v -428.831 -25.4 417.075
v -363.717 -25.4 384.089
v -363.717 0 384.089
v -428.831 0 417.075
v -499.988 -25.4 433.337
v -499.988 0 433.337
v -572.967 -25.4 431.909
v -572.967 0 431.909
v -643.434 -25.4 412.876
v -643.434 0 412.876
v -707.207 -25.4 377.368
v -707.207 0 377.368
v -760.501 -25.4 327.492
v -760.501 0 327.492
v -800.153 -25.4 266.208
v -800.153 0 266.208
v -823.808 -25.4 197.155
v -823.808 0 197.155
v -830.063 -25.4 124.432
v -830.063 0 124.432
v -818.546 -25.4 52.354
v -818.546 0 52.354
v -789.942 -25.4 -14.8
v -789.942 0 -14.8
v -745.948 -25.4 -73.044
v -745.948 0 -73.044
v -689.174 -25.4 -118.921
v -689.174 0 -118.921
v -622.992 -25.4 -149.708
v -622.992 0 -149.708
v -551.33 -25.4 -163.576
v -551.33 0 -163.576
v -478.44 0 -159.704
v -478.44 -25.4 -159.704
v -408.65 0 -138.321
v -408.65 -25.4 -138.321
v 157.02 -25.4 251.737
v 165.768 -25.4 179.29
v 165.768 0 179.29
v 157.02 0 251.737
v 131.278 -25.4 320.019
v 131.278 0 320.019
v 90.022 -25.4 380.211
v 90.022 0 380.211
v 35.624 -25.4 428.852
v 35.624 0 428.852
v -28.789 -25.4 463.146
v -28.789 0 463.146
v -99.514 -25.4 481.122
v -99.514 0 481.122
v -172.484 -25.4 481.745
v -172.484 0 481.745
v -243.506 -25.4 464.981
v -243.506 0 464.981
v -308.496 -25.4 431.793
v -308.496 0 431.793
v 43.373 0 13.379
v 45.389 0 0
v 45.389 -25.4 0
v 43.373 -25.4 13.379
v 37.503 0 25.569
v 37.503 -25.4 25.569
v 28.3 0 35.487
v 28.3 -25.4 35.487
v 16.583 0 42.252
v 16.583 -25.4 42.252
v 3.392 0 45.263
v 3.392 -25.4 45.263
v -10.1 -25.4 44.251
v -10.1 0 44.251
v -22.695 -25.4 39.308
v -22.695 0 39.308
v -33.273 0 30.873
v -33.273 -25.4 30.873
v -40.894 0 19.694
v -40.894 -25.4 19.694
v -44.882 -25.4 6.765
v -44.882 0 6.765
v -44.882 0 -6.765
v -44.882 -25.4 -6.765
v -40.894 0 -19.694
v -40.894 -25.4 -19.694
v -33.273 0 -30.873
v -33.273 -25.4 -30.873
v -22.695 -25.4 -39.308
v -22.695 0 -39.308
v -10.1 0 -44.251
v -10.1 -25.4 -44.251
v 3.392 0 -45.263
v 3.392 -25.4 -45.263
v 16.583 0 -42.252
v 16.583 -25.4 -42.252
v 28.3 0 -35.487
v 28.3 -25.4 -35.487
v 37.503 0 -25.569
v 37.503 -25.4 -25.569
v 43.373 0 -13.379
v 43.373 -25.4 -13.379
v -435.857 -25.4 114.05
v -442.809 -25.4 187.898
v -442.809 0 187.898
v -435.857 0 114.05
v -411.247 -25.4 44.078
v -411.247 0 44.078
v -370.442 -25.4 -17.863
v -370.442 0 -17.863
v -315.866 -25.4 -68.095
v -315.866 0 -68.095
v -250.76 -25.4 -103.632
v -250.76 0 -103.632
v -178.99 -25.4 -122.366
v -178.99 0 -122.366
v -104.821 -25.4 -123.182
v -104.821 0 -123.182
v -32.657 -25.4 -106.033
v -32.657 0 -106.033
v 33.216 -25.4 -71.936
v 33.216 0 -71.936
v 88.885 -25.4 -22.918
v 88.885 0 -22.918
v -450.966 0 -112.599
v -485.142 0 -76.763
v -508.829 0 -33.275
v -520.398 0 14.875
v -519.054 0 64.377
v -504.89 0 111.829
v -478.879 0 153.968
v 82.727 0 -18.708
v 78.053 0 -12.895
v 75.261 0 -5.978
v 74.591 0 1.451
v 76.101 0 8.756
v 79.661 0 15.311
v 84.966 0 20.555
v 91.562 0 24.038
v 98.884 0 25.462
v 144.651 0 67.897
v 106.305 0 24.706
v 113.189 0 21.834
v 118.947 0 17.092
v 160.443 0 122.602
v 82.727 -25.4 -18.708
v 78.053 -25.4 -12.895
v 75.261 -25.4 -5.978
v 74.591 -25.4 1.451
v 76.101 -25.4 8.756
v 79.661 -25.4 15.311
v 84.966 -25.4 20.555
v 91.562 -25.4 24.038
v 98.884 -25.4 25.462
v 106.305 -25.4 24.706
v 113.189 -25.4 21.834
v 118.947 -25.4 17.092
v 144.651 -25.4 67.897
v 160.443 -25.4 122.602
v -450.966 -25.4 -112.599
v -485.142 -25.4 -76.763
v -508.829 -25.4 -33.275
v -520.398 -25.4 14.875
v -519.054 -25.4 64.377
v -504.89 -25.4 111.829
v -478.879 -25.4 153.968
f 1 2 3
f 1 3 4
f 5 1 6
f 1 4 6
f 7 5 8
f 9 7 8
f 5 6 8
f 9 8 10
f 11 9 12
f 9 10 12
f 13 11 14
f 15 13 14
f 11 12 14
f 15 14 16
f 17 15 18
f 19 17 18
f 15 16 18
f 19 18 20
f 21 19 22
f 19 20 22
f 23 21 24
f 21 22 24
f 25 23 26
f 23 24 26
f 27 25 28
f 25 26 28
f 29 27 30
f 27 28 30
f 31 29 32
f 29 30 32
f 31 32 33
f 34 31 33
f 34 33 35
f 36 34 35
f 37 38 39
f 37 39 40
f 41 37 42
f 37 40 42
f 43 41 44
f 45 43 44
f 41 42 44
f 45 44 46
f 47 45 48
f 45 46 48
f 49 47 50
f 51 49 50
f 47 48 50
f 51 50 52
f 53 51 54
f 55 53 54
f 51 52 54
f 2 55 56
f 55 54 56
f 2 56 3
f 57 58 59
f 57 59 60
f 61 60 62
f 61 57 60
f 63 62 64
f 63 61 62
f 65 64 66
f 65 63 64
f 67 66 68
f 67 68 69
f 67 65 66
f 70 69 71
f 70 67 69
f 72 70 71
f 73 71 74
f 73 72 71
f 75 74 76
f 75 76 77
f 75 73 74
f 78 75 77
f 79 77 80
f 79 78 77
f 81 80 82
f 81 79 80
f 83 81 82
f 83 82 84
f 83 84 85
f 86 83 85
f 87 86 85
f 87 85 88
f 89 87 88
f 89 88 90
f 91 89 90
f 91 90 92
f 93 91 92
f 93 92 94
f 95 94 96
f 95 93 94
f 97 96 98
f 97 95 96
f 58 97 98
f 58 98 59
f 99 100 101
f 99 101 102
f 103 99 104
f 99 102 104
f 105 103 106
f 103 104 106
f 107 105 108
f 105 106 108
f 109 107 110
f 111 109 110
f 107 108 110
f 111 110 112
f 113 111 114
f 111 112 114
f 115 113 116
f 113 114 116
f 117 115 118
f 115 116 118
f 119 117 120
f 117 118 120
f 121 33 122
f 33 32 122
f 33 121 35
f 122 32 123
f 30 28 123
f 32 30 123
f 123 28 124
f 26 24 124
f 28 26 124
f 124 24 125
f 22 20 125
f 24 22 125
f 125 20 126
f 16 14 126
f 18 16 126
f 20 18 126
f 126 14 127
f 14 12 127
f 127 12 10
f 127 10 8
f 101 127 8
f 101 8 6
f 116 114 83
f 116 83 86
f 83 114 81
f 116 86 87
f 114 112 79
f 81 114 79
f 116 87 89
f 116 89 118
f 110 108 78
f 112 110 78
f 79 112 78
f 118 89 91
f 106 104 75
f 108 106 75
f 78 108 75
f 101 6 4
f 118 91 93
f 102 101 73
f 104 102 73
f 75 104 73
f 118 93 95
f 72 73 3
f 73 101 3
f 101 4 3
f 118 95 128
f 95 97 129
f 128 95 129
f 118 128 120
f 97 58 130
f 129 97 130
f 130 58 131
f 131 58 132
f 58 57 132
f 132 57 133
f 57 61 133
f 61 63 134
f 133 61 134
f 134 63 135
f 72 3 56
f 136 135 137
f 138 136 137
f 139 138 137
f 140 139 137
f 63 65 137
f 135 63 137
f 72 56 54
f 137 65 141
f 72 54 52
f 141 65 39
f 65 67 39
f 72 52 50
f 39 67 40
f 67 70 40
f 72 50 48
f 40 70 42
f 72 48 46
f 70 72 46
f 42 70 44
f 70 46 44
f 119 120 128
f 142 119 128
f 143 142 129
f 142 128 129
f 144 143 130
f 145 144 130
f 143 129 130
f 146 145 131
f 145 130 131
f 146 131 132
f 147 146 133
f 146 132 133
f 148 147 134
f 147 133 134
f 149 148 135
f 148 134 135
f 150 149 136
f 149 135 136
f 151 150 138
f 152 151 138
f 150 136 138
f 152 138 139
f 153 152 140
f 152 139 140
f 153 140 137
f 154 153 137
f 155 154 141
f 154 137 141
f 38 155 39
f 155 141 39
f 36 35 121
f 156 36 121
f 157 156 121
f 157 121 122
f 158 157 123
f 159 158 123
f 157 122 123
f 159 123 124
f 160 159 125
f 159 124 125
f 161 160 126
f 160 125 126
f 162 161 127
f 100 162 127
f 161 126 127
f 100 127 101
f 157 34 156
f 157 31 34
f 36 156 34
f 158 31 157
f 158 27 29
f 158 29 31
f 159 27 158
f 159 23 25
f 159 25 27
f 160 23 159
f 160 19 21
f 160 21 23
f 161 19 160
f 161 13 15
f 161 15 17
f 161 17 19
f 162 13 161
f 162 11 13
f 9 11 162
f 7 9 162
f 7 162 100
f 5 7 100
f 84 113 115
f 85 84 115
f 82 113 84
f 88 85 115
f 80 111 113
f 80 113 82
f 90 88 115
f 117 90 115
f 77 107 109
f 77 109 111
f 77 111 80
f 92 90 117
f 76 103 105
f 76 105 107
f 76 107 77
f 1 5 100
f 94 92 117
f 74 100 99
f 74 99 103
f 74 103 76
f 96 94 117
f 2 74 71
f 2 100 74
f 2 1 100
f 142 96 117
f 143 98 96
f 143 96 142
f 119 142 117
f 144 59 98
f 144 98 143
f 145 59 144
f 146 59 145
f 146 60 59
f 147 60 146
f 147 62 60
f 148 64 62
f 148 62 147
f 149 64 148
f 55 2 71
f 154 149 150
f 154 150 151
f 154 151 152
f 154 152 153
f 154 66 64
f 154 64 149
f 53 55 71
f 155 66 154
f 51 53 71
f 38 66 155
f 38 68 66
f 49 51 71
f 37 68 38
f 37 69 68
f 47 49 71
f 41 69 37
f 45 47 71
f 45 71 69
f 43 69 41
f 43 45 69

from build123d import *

# Parameters (mm, degrees)
F2_DEPTH = 25.4
F0_R     = 45.389454
F3_DEPTH = 25.4


with BuildPart() as f2:
    # F1 (on face) → F2 (new body)
    with BuildSketch(Plane.XZ):
        with BuildLine():
            ThreePointArc((-408.650134, -138.321041), (-500.899934, 120.173805), (-237.660617, 197.856963))
            ThreePointArc((-237.660617, 197.856963), (-797.702842, 271.136049), (-408.650134, -138.321041))
        make_face()
    extrude(amount=F2_DEPTH)

    # F0 (on Front) → F3 (join)
    with BuildSketch(Plane.XZ):
        with BuildLine():
            ThreePointArc((88.884516, -22.918433), (79.660927, 15.310849), (118.946802, 17.092003))
            ThreePointArc((118.946802, 17.092003), (153.828866, 94.879416), (165.768481, 179.289639))
            ThreePointArc((165.768481, 179.289639), (-423.061654, 287.455309), (88.884516, -22.918433))
        make_face()
        Circle(F0_R, mode=Mode.SUBTRACT)
    extrude(amount=F3_DEPTH)


solid = f2.part
